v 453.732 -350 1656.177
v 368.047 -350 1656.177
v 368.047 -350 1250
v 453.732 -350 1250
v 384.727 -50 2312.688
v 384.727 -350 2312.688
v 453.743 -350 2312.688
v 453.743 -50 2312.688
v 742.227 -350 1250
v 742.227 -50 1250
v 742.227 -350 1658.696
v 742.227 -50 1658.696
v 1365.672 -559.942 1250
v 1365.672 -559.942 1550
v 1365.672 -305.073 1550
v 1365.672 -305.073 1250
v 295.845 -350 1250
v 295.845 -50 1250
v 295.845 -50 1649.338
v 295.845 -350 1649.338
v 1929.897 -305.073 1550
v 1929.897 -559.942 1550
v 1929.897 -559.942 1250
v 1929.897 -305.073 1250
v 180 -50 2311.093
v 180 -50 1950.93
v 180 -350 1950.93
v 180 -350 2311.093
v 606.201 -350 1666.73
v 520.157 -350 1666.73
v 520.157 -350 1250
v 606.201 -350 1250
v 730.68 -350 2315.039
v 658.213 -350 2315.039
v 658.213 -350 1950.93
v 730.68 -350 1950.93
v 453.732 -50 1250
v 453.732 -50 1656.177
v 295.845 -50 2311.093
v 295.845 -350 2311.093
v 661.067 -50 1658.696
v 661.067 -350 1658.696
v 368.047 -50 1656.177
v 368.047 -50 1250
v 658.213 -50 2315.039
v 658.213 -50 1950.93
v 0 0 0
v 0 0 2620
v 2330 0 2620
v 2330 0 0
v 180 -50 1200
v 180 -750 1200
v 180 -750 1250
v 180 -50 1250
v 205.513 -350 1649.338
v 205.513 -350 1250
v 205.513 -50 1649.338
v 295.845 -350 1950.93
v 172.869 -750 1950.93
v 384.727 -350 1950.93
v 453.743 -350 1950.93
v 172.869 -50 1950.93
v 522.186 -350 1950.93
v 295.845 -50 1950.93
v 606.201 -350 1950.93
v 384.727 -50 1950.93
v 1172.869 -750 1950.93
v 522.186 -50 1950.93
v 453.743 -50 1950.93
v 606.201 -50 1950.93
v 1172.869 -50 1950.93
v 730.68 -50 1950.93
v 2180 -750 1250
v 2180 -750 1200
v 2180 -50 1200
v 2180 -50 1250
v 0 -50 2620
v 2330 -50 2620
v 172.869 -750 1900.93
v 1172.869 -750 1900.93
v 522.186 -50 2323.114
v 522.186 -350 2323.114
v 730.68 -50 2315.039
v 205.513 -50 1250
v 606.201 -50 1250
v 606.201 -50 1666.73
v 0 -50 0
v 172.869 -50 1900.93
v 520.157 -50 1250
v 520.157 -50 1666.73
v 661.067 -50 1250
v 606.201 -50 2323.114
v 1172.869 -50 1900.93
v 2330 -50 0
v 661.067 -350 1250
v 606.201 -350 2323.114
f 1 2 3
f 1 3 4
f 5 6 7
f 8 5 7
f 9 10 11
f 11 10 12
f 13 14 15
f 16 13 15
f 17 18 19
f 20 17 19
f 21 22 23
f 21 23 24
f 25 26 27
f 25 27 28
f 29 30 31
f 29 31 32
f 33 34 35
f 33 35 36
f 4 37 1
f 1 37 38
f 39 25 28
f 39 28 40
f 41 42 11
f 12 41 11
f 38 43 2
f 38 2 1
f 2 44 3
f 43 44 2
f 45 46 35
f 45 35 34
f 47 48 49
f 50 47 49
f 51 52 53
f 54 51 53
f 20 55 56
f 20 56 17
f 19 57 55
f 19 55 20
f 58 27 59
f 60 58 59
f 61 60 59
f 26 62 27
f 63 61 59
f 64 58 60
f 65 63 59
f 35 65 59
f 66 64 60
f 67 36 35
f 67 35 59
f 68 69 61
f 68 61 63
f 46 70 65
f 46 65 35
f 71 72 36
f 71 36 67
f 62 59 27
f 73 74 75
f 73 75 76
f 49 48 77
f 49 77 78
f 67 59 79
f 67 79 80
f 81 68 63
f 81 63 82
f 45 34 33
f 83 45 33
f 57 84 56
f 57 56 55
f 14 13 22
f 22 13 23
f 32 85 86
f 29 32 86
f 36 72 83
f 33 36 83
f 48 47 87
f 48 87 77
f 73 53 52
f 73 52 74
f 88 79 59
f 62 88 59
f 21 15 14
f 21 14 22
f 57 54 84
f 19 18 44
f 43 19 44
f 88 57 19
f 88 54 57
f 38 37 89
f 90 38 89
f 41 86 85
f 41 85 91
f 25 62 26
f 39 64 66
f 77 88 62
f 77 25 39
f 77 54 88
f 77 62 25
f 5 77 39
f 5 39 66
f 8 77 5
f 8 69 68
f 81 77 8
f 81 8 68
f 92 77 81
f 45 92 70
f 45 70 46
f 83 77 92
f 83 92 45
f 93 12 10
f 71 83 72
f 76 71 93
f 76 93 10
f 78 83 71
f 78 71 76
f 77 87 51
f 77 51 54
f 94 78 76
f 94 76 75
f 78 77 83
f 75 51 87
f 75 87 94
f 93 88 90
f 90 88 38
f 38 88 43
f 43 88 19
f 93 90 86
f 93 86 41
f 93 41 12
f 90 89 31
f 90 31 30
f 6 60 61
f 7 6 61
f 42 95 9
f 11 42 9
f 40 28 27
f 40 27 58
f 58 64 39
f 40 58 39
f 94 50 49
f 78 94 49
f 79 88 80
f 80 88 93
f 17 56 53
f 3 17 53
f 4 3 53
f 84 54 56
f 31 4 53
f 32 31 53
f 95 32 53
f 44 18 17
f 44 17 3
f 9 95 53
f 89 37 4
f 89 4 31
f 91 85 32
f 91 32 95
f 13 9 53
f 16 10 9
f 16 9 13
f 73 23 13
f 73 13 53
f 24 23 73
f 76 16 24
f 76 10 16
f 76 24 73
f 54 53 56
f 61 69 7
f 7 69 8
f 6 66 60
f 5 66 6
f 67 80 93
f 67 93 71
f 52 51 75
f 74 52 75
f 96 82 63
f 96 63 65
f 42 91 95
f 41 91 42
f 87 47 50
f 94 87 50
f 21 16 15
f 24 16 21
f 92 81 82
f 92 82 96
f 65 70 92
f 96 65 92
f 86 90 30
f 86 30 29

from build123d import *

# Parameters (mm, degrees)
F0_W     = 2330
F0_H     = 2620
F1_DEPTH = 50
F2_W     = 2000
F2_H     = 50
F3_DEPTH = 700
F4_W     = 1000
F4_H     = 50
F5_DEPTH = 700
F6_W     = 90.3320163488
F6_H     = 399.3376493454
F6_W_2   = 85.6856405735
F6_H_2   = 406.1774015427
F6_W_3   = 86.0437750816
F6_H_3   = 416.7296886444
F6_W_4   = 81.160068512
F6_H_4   = 408.6964130402
F6_W_5   = 115.8454191685
F6_H_5   = 360.1629257202
F6_W_6   = 69.016456604
F6_H_6   = 361.758184433
F6_W_7   = 84.0144753456
F6_H_7   = 372.1844673157
F6_W_8   = 72.4673271179
F6_H_8   = 364.1092300415
F7_DEPTH = 300
F8_W     = 564.2251968384
F8_H     = 254.868388176
F9_DEPTH = 300


with BuildPart() as f1:
    # F0 (on Front) → F1 (new body)
    with BuildSketch(Plane.XZ):
        with Locations((1165, 1310)):
            Rectangle(F0_W, F0_H)
    extrude(amount=F1_DEPTH)

    # F2 (on face) → F3 (join)
    with BuildSketch(Plane.XZ.offset(50)):
        with Locations((1180, 1225)):
            Rectangle(F2_W, F2_H)
    extrude(amount=F3_DEPTH)

    # F4 (on face) → F5 (join)
    with BuildSketch(Plane.XZ.offset(50)):
        with Locations((672.8687286377, 1925.9296894073)):
            Rectangle(F4_W, F4_H)
    extrude(amount=F5_DEPTH)

    # F6 (on face) → F7 (join)
    with BuildSketch(Plane.XZ.offset(50)):
        with Locations((250.6794109941, 1449.6688246727)):
            Rectangle(F6_W, F6_H)
        with Locations((410.8895212412, 1453.0887007713)):
            Rectangle(F6_W_2, F6_H_2)
        with Locations((563.178807497, 1458.3648443222)):
            Rectangle(F6_W_3, F6_H_3)
        with Locations((701.6470432281, 1454.3482065201)):
            Rectangle(F6_W_4, F6_H_4)
        with Locations((237.9227095842, 2131.0111522675)):
            Rectangle(F6_W_5, F6_H_5)
        with Locations((419.2352294922, 2131.8087816238)):
            Rectangle(F6_W_6, F6_H_6)
        with Locations((564.193457365, 2137.0219230652)):
            Rectangle(F6_W_7, F6_H_7)
        with Locations((694.4462656975, 2132.9843044281)):
            Rectangle(F6_W_8, F6_H_8)
    extrude(amount=F7_DEPTH)

    # F8 (on face) → F9 (join)
    with BuildSketch(Plane.XY.offset(1250)):
        with Locations((1647.7845907211, -432.5073957443)):
            Rectangle(F8_W, F8_H)
    extrude(amount=F9_DEPTH)


solid = f1.part
